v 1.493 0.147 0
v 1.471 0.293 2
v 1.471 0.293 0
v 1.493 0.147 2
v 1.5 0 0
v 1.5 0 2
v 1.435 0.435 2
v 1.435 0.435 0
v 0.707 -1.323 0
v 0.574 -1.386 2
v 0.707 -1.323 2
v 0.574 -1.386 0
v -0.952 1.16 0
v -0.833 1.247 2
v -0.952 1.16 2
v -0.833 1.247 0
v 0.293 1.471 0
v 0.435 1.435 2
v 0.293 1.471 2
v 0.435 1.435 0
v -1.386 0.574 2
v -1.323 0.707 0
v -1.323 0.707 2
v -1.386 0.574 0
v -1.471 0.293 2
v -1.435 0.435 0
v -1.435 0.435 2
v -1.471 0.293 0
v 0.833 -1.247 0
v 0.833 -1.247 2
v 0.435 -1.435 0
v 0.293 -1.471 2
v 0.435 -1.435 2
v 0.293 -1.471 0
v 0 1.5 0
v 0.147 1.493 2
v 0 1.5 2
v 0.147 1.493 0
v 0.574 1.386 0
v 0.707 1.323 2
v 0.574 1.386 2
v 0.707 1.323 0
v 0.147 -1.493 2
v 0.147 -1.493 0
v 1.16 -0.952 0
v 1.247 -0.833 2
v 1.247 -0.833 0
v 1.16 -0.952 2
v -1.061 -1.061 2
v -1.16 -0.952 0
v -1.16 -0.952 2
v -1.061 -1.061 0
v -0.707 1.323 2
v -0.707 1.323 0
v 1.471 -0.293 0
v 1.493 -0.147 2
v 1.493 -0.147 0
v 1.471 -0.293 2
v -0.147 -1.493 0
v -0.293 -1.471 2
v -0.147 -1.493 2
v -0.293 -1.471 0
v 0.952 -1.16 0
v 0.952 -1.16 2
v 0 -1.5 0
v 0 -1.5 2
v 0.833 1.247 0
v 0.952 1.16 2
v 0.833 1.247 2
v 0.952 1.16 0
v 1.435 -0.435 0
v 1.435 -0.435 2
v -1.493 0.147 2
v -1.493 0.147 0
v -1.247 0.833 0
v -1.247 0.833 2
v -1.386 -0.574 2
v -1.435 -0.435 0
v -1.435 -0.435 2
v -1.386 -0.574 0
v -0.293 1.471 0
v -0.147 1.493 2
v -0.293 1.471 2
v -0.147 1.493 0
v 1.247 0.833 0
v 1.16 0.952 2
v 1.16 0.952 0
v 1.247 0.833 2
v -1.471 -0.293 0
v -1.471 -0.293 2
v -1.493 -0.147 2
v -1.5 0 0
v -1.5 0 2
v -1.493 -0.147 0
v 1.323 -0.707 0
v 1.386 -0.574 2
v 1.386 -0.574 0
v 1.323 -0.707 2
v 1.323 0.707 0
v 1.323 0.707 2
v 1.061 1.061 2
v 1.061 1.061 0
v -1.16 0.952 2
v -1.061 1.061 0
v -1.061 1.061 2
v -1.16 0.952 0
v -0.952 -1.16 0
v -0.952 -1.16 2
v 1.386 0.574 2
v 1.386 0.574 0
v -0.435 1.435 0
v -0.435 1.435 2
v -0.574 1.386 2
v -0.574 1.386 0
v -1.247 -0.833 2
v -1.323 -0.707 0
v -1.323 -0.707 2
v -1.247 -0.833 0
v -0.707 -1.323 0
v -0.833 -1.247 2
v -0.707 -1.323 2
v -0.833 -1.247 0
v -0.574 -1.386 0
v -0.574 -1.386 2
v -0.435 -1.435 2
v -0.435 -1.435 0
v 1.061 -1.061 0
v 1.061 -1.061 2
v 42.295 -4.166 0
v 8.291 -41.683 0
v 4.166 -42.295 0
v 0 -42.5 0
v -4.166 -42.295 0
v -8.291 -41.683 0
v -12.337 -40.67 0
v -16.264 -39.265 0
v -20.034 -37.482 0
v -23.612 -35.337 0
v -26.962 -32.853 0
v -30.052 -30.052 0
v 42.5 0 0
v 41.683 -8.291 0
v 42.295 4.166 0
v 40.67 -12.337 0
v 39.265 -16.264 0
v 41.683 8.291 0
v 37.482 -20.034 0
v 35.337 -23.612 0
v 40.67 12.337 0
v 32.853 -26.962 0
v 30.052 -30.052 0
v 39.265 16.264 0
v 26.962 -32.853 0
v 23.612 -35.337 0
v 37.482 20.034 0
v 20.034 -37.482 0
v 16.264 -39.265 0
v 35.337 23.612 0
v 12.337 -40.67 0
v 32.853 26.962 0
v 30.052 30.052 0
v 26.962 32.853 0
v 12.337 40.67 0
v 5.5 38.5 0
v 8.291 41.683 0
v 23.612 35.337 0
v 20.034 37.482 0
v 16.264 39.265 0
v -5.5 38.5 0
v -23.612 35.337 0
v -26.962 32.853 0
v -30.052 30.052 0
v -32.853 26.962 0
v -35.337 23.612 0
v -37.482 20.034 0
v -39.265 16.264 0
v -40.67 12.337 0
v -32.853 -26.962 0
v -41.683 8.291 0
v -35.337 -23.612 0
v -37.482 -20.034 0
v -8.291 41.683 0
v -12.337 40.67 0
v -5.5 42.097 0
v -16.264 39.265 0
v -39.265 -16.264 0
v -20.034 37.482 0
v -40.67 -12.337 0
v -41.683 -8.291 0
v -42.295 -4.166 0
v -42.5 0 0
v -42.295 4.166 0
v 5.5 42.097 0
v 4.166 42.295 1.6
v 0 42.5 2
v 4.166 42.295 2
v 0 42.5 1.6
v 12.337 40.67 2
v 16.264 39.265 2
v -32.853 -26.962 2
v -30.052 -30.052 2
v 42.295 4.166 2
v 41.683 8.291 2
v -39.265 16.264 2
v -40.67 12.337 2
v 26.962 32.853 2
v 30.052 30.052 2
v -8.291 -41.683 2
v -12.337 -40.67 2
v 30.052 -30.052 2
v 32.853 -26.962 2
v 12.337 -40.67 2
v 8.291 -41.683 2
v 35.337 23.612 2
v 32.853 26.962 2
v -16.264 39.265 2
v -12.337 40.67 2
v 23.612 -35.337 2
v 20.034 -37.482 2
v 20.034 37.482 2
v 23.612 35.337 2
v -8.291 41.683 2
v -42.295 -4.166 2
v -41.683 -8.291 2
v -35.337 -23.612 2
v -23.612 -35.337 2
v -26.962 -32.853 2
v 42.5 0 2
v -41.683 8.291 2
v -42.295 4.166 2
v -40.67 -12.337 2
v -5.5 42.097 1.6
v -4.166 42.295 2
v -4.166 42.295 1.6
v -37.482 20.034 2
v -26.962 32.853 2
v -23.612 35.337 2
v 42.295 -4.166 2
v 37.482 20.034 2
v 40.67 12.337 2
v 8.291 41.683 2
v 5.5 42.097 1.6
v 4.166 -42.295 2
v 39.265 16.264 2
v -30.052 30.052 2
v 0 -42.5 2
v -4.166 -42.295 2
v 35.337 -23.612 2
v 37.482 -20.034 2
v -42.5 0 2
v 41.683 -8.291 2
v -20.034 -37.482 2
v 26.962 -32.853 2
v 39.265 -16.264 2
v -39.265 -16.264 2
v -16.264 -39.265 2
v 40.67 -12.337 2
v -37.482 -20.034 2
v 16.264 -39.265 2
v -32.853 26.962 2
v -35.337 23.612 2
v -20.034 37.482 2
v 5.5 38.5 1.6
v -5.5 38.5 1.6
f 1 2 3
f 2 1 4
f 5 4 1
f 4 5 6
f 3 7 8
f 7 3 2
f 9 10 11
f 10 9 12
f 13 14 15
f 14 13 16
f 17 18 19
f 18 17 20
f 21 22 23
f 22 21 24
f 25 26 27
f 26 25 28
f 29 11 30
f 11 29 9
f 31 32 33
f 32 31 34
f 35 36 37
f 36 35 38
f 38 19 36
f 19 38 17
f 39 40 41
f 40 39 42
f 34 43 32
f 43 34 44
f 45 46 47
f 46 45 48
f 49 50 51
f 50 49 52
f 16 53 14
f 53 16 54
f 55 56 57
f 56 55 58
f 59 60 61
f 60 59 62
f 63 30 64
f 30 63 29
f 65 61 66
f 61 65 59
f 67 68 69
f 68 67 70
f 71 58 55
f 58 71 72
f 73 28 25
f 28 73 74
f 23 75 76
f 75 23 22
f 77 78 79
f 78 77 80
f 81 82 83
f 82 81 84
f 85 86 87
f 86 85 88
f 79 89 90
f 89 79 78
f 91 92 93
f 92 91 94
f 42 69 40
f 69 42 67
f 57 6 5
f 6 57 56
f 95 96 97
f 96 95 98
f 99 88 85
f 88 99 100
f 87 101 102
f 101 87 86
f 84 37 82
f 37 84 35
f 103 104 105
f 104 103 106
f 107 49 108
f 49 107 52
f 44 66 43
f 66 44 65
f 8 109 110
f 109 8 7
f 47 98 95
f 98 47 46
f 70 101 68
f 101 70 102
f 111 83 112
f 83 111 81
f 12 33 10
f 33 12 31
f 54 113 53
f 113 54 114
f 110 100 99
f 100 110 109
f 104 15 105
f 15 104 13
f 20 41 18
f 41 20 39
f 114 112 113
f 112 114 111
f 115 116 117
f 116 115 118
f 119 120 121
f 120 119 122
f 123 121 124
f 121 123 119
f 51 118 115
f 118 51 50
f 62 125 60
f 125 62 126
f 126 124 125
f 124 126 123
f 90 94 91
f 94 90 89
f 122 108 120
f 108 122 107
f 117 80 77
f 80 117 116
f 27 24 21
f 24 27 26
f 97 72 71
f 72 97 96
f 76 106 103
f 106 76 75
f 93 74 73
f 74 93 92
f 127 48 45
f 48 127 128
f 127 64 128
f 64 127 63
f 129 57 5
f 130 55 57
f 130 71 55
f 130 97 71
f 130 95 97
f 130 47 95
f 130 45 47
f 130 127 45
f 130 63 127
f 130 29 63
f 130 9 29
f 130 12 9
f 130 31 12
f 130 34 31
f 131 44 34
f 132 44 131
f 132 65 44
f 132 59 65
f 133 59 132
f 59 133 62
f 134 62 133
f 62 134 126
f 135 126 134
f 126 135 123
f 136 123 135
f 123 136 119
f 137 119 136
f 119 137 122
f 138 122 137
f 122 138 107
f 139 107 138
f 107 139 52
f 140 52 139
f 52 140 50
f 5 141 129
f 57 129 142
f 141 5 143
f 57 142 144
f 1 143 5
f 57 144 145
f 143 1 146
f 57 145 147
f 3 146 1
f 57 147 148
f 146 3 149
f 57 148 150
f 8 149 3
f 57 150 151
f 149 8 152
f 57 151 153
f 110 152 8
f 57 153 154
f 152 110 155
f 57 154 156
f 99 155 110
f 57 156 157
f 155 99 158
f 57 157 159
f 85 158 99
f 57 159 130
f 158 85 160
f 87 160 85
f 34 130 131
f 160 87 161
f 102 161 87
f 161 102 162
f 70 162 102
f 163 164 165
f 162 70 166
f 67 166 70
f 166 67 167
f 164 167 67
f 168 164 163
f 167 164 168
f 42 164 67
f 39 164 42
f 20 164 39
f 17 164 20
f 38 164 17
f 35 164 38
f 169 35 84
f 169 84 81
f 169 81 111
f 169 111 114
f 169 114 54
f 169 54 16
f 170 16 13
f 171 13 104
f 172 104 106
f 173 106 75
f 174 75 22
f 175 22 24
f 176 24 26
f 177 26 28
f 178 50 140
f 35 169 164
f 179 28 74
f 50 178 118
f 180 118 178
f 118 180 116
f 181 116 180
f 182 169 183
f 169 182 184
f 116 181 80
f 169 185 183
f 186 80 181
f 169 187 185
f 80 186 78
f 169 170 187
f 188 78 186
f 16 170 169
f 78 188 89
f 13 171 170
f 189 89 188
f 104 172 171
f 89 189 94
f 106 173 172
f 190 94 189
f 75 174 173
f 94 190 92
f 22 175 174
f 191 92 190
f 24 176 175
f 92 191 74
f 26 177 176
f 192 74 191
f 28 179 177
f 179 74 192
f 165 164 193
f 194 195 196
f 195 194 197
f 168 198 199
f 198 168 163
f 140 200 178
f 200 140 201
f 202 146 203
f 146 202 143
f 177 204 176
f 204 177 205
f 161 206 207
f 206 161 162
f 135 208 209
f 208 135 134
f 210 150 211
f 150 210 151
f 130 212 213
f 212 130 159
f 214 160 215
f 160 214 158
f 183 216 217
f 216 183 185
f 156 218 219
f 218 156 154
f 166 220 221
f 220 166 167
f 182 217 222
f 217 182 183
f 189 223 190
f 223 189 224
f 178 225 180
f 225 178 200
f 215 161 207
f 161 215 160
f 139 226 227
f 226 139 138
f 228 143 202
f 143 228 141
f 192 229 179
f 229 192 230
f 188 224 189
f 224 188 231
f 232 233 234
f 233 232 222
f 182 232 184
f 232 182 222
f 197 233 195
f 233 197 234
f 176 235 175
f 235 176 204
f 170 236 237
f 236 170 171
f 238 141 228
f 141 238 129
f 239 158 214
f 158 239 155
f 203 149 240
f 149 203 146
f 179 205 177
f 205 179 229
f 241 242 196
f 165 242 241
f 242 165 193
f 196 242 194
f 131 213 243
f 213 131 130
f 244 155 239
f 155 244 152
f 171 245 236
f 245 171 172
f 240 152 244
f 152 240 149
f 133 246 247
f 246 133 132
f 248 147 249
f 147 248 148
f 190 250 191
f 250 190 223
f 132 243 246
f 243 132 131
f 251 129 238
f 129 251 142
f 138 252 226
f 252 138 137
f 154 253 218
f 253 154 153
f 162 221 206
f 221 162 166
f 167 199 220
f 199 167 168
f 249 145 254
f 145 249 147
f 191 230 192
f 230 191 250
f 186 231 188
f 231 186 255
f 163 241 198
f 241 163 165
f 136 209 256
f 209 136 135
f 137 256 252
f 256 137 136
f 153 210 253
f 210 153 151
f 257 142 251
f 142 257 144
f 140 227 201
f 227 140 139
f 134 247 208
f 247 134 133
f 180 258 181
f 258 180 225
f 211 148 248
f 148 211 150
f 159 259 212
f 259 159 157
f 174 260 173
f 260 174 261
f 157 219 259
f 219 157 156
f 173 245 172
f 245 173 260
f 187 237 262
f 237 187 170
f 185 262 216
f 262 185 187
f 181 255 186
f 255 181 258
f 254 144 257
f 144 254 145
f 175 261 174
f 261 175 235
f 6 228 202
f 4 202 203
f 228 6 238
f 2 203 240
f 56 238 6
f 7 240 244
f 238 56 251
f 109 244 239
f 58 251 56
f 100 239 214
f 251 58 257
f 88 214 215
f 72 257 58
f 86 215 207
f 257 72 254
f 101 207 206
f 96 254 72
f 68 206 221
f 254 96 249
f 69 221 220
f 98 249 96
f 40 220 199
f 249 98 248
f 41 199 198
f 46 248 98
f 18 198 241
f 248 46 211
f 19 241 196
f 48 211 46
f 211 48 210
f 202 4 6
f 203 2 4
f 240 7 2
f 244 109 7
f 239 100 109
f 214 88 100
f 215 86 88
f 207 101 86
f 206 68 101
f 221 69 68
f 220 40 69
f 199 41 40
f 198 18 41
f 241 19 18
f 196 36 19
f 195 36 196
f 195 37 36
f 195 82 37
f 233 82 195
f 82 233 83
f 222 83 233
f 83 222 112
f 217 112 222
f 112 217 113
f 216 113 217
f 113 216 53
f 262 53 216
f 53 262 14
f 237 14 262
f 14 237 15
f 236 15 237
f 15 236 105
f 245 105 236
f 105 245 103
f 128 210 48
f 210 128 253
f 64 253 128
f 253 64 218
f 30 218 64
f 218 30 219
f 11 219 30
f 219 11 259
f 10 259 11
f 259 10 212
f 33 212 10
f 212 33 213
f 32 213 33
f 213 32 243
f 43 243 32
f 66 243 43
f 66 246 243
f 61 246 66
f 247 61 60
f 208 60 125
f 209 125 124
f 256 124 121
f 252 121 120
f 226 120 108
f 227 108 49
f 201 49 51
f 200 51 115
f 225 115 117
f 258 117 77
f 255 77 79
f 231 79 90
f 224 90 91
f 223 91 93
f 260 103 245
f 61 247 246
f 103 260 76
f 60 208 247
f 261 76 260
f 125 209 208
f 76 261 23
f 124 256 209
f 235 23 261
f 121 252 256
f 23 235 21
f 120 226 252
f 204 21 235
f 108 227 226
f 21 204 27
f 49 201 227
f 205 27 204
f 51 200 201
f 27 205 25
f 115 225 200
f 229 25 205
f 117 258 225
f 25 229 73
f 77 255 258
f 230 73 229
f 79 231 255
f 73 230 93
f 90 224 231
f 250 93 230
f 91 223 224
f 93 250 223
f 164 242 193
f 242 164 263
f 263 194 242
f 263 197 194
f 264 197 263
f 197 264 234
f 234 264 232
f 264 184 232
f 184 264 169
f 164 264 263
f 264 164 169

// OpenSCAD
// --- Dimensions (mm) ---
disc_diameter = 85.0;      // Diameter of the main disc
disc_thickness = 2.0;      // Thickness of the disc
hole_diameter = 3.0;       // Diameter of the sowing holes
grid_spacing = 9.0;        // Center-to-center distance between holes
grid_count = 7;            // Number of holes in X and Y directions

notch_width = 10.0;        // Width of the notch (X direction)
notch_depth = 4.0;         // Depth of the notch from the rim (Y direction)
notch_height = 2.1;        // Height of the notch (slightly taller than disc to ensure clean cut)

// --- Constants ---
$fn = 64;                  // Smoothness for circles/cylinders

// --- Implementation ---

// The part is modeled resting on the XY plane (Z=0)
module sowing_template() {
    difference() {
        // Main Disc Body
        cylinder(h = disc_thickness, d = disc_diameter, center = false);

        // 1. The Grid of Holes
        // Calculate the offset to center the grid on the disc
        // The grid spans (grid_count - 1) * grid_spacing
        grid_span = (grid_count - 1) * grid_spacing;
        offset = grid_span / 2;

        for (i = [0 : grid_count - 1]) {
            for (j = [0 : grid_count - 1]) {
                translate(
                    x = i * grid_spacing - offset, 
                    y = j * grid_spacing - offset, 
                    z = -0.5 // Extend below to ensure clean cut
                )
                cylinder(h = disc_thickness + 1, d = hole_diameter);
            }
        }

        // 2. The Orientation Notch
        // Located on the +Y side, centered on X axis.
        // Notch is 10mm wide (X) and 4mm deep (Y) from the rim.
        // We use a hull or a simple cube to define the notch volume.
        // To ensure a clean cut, we make the notch slightly taller and wider.
        
        // Calculate the Y position: 
        // The rim is at Y = disc_diameter / 2. 
        // The notch goes 4mm deep, so it ends at Y = (disc_diameter / 2) - 4.
        // We extend the notch slightly past the rim in Y to ensure a clean cut.
        
        notch_y_start = (disc_diameter / 2) - notch_depth;
        notch_y_end = (disc_diameter / 2) + 1; // Extend past rim
        
        translate([-(notch_width + 1) / 2, notch_y_start, -0.5])
        cube([notch_width + 1, notch_y_end - notch_y_start, notch_height]);
    }
}

// Render the part
sowing_template();
